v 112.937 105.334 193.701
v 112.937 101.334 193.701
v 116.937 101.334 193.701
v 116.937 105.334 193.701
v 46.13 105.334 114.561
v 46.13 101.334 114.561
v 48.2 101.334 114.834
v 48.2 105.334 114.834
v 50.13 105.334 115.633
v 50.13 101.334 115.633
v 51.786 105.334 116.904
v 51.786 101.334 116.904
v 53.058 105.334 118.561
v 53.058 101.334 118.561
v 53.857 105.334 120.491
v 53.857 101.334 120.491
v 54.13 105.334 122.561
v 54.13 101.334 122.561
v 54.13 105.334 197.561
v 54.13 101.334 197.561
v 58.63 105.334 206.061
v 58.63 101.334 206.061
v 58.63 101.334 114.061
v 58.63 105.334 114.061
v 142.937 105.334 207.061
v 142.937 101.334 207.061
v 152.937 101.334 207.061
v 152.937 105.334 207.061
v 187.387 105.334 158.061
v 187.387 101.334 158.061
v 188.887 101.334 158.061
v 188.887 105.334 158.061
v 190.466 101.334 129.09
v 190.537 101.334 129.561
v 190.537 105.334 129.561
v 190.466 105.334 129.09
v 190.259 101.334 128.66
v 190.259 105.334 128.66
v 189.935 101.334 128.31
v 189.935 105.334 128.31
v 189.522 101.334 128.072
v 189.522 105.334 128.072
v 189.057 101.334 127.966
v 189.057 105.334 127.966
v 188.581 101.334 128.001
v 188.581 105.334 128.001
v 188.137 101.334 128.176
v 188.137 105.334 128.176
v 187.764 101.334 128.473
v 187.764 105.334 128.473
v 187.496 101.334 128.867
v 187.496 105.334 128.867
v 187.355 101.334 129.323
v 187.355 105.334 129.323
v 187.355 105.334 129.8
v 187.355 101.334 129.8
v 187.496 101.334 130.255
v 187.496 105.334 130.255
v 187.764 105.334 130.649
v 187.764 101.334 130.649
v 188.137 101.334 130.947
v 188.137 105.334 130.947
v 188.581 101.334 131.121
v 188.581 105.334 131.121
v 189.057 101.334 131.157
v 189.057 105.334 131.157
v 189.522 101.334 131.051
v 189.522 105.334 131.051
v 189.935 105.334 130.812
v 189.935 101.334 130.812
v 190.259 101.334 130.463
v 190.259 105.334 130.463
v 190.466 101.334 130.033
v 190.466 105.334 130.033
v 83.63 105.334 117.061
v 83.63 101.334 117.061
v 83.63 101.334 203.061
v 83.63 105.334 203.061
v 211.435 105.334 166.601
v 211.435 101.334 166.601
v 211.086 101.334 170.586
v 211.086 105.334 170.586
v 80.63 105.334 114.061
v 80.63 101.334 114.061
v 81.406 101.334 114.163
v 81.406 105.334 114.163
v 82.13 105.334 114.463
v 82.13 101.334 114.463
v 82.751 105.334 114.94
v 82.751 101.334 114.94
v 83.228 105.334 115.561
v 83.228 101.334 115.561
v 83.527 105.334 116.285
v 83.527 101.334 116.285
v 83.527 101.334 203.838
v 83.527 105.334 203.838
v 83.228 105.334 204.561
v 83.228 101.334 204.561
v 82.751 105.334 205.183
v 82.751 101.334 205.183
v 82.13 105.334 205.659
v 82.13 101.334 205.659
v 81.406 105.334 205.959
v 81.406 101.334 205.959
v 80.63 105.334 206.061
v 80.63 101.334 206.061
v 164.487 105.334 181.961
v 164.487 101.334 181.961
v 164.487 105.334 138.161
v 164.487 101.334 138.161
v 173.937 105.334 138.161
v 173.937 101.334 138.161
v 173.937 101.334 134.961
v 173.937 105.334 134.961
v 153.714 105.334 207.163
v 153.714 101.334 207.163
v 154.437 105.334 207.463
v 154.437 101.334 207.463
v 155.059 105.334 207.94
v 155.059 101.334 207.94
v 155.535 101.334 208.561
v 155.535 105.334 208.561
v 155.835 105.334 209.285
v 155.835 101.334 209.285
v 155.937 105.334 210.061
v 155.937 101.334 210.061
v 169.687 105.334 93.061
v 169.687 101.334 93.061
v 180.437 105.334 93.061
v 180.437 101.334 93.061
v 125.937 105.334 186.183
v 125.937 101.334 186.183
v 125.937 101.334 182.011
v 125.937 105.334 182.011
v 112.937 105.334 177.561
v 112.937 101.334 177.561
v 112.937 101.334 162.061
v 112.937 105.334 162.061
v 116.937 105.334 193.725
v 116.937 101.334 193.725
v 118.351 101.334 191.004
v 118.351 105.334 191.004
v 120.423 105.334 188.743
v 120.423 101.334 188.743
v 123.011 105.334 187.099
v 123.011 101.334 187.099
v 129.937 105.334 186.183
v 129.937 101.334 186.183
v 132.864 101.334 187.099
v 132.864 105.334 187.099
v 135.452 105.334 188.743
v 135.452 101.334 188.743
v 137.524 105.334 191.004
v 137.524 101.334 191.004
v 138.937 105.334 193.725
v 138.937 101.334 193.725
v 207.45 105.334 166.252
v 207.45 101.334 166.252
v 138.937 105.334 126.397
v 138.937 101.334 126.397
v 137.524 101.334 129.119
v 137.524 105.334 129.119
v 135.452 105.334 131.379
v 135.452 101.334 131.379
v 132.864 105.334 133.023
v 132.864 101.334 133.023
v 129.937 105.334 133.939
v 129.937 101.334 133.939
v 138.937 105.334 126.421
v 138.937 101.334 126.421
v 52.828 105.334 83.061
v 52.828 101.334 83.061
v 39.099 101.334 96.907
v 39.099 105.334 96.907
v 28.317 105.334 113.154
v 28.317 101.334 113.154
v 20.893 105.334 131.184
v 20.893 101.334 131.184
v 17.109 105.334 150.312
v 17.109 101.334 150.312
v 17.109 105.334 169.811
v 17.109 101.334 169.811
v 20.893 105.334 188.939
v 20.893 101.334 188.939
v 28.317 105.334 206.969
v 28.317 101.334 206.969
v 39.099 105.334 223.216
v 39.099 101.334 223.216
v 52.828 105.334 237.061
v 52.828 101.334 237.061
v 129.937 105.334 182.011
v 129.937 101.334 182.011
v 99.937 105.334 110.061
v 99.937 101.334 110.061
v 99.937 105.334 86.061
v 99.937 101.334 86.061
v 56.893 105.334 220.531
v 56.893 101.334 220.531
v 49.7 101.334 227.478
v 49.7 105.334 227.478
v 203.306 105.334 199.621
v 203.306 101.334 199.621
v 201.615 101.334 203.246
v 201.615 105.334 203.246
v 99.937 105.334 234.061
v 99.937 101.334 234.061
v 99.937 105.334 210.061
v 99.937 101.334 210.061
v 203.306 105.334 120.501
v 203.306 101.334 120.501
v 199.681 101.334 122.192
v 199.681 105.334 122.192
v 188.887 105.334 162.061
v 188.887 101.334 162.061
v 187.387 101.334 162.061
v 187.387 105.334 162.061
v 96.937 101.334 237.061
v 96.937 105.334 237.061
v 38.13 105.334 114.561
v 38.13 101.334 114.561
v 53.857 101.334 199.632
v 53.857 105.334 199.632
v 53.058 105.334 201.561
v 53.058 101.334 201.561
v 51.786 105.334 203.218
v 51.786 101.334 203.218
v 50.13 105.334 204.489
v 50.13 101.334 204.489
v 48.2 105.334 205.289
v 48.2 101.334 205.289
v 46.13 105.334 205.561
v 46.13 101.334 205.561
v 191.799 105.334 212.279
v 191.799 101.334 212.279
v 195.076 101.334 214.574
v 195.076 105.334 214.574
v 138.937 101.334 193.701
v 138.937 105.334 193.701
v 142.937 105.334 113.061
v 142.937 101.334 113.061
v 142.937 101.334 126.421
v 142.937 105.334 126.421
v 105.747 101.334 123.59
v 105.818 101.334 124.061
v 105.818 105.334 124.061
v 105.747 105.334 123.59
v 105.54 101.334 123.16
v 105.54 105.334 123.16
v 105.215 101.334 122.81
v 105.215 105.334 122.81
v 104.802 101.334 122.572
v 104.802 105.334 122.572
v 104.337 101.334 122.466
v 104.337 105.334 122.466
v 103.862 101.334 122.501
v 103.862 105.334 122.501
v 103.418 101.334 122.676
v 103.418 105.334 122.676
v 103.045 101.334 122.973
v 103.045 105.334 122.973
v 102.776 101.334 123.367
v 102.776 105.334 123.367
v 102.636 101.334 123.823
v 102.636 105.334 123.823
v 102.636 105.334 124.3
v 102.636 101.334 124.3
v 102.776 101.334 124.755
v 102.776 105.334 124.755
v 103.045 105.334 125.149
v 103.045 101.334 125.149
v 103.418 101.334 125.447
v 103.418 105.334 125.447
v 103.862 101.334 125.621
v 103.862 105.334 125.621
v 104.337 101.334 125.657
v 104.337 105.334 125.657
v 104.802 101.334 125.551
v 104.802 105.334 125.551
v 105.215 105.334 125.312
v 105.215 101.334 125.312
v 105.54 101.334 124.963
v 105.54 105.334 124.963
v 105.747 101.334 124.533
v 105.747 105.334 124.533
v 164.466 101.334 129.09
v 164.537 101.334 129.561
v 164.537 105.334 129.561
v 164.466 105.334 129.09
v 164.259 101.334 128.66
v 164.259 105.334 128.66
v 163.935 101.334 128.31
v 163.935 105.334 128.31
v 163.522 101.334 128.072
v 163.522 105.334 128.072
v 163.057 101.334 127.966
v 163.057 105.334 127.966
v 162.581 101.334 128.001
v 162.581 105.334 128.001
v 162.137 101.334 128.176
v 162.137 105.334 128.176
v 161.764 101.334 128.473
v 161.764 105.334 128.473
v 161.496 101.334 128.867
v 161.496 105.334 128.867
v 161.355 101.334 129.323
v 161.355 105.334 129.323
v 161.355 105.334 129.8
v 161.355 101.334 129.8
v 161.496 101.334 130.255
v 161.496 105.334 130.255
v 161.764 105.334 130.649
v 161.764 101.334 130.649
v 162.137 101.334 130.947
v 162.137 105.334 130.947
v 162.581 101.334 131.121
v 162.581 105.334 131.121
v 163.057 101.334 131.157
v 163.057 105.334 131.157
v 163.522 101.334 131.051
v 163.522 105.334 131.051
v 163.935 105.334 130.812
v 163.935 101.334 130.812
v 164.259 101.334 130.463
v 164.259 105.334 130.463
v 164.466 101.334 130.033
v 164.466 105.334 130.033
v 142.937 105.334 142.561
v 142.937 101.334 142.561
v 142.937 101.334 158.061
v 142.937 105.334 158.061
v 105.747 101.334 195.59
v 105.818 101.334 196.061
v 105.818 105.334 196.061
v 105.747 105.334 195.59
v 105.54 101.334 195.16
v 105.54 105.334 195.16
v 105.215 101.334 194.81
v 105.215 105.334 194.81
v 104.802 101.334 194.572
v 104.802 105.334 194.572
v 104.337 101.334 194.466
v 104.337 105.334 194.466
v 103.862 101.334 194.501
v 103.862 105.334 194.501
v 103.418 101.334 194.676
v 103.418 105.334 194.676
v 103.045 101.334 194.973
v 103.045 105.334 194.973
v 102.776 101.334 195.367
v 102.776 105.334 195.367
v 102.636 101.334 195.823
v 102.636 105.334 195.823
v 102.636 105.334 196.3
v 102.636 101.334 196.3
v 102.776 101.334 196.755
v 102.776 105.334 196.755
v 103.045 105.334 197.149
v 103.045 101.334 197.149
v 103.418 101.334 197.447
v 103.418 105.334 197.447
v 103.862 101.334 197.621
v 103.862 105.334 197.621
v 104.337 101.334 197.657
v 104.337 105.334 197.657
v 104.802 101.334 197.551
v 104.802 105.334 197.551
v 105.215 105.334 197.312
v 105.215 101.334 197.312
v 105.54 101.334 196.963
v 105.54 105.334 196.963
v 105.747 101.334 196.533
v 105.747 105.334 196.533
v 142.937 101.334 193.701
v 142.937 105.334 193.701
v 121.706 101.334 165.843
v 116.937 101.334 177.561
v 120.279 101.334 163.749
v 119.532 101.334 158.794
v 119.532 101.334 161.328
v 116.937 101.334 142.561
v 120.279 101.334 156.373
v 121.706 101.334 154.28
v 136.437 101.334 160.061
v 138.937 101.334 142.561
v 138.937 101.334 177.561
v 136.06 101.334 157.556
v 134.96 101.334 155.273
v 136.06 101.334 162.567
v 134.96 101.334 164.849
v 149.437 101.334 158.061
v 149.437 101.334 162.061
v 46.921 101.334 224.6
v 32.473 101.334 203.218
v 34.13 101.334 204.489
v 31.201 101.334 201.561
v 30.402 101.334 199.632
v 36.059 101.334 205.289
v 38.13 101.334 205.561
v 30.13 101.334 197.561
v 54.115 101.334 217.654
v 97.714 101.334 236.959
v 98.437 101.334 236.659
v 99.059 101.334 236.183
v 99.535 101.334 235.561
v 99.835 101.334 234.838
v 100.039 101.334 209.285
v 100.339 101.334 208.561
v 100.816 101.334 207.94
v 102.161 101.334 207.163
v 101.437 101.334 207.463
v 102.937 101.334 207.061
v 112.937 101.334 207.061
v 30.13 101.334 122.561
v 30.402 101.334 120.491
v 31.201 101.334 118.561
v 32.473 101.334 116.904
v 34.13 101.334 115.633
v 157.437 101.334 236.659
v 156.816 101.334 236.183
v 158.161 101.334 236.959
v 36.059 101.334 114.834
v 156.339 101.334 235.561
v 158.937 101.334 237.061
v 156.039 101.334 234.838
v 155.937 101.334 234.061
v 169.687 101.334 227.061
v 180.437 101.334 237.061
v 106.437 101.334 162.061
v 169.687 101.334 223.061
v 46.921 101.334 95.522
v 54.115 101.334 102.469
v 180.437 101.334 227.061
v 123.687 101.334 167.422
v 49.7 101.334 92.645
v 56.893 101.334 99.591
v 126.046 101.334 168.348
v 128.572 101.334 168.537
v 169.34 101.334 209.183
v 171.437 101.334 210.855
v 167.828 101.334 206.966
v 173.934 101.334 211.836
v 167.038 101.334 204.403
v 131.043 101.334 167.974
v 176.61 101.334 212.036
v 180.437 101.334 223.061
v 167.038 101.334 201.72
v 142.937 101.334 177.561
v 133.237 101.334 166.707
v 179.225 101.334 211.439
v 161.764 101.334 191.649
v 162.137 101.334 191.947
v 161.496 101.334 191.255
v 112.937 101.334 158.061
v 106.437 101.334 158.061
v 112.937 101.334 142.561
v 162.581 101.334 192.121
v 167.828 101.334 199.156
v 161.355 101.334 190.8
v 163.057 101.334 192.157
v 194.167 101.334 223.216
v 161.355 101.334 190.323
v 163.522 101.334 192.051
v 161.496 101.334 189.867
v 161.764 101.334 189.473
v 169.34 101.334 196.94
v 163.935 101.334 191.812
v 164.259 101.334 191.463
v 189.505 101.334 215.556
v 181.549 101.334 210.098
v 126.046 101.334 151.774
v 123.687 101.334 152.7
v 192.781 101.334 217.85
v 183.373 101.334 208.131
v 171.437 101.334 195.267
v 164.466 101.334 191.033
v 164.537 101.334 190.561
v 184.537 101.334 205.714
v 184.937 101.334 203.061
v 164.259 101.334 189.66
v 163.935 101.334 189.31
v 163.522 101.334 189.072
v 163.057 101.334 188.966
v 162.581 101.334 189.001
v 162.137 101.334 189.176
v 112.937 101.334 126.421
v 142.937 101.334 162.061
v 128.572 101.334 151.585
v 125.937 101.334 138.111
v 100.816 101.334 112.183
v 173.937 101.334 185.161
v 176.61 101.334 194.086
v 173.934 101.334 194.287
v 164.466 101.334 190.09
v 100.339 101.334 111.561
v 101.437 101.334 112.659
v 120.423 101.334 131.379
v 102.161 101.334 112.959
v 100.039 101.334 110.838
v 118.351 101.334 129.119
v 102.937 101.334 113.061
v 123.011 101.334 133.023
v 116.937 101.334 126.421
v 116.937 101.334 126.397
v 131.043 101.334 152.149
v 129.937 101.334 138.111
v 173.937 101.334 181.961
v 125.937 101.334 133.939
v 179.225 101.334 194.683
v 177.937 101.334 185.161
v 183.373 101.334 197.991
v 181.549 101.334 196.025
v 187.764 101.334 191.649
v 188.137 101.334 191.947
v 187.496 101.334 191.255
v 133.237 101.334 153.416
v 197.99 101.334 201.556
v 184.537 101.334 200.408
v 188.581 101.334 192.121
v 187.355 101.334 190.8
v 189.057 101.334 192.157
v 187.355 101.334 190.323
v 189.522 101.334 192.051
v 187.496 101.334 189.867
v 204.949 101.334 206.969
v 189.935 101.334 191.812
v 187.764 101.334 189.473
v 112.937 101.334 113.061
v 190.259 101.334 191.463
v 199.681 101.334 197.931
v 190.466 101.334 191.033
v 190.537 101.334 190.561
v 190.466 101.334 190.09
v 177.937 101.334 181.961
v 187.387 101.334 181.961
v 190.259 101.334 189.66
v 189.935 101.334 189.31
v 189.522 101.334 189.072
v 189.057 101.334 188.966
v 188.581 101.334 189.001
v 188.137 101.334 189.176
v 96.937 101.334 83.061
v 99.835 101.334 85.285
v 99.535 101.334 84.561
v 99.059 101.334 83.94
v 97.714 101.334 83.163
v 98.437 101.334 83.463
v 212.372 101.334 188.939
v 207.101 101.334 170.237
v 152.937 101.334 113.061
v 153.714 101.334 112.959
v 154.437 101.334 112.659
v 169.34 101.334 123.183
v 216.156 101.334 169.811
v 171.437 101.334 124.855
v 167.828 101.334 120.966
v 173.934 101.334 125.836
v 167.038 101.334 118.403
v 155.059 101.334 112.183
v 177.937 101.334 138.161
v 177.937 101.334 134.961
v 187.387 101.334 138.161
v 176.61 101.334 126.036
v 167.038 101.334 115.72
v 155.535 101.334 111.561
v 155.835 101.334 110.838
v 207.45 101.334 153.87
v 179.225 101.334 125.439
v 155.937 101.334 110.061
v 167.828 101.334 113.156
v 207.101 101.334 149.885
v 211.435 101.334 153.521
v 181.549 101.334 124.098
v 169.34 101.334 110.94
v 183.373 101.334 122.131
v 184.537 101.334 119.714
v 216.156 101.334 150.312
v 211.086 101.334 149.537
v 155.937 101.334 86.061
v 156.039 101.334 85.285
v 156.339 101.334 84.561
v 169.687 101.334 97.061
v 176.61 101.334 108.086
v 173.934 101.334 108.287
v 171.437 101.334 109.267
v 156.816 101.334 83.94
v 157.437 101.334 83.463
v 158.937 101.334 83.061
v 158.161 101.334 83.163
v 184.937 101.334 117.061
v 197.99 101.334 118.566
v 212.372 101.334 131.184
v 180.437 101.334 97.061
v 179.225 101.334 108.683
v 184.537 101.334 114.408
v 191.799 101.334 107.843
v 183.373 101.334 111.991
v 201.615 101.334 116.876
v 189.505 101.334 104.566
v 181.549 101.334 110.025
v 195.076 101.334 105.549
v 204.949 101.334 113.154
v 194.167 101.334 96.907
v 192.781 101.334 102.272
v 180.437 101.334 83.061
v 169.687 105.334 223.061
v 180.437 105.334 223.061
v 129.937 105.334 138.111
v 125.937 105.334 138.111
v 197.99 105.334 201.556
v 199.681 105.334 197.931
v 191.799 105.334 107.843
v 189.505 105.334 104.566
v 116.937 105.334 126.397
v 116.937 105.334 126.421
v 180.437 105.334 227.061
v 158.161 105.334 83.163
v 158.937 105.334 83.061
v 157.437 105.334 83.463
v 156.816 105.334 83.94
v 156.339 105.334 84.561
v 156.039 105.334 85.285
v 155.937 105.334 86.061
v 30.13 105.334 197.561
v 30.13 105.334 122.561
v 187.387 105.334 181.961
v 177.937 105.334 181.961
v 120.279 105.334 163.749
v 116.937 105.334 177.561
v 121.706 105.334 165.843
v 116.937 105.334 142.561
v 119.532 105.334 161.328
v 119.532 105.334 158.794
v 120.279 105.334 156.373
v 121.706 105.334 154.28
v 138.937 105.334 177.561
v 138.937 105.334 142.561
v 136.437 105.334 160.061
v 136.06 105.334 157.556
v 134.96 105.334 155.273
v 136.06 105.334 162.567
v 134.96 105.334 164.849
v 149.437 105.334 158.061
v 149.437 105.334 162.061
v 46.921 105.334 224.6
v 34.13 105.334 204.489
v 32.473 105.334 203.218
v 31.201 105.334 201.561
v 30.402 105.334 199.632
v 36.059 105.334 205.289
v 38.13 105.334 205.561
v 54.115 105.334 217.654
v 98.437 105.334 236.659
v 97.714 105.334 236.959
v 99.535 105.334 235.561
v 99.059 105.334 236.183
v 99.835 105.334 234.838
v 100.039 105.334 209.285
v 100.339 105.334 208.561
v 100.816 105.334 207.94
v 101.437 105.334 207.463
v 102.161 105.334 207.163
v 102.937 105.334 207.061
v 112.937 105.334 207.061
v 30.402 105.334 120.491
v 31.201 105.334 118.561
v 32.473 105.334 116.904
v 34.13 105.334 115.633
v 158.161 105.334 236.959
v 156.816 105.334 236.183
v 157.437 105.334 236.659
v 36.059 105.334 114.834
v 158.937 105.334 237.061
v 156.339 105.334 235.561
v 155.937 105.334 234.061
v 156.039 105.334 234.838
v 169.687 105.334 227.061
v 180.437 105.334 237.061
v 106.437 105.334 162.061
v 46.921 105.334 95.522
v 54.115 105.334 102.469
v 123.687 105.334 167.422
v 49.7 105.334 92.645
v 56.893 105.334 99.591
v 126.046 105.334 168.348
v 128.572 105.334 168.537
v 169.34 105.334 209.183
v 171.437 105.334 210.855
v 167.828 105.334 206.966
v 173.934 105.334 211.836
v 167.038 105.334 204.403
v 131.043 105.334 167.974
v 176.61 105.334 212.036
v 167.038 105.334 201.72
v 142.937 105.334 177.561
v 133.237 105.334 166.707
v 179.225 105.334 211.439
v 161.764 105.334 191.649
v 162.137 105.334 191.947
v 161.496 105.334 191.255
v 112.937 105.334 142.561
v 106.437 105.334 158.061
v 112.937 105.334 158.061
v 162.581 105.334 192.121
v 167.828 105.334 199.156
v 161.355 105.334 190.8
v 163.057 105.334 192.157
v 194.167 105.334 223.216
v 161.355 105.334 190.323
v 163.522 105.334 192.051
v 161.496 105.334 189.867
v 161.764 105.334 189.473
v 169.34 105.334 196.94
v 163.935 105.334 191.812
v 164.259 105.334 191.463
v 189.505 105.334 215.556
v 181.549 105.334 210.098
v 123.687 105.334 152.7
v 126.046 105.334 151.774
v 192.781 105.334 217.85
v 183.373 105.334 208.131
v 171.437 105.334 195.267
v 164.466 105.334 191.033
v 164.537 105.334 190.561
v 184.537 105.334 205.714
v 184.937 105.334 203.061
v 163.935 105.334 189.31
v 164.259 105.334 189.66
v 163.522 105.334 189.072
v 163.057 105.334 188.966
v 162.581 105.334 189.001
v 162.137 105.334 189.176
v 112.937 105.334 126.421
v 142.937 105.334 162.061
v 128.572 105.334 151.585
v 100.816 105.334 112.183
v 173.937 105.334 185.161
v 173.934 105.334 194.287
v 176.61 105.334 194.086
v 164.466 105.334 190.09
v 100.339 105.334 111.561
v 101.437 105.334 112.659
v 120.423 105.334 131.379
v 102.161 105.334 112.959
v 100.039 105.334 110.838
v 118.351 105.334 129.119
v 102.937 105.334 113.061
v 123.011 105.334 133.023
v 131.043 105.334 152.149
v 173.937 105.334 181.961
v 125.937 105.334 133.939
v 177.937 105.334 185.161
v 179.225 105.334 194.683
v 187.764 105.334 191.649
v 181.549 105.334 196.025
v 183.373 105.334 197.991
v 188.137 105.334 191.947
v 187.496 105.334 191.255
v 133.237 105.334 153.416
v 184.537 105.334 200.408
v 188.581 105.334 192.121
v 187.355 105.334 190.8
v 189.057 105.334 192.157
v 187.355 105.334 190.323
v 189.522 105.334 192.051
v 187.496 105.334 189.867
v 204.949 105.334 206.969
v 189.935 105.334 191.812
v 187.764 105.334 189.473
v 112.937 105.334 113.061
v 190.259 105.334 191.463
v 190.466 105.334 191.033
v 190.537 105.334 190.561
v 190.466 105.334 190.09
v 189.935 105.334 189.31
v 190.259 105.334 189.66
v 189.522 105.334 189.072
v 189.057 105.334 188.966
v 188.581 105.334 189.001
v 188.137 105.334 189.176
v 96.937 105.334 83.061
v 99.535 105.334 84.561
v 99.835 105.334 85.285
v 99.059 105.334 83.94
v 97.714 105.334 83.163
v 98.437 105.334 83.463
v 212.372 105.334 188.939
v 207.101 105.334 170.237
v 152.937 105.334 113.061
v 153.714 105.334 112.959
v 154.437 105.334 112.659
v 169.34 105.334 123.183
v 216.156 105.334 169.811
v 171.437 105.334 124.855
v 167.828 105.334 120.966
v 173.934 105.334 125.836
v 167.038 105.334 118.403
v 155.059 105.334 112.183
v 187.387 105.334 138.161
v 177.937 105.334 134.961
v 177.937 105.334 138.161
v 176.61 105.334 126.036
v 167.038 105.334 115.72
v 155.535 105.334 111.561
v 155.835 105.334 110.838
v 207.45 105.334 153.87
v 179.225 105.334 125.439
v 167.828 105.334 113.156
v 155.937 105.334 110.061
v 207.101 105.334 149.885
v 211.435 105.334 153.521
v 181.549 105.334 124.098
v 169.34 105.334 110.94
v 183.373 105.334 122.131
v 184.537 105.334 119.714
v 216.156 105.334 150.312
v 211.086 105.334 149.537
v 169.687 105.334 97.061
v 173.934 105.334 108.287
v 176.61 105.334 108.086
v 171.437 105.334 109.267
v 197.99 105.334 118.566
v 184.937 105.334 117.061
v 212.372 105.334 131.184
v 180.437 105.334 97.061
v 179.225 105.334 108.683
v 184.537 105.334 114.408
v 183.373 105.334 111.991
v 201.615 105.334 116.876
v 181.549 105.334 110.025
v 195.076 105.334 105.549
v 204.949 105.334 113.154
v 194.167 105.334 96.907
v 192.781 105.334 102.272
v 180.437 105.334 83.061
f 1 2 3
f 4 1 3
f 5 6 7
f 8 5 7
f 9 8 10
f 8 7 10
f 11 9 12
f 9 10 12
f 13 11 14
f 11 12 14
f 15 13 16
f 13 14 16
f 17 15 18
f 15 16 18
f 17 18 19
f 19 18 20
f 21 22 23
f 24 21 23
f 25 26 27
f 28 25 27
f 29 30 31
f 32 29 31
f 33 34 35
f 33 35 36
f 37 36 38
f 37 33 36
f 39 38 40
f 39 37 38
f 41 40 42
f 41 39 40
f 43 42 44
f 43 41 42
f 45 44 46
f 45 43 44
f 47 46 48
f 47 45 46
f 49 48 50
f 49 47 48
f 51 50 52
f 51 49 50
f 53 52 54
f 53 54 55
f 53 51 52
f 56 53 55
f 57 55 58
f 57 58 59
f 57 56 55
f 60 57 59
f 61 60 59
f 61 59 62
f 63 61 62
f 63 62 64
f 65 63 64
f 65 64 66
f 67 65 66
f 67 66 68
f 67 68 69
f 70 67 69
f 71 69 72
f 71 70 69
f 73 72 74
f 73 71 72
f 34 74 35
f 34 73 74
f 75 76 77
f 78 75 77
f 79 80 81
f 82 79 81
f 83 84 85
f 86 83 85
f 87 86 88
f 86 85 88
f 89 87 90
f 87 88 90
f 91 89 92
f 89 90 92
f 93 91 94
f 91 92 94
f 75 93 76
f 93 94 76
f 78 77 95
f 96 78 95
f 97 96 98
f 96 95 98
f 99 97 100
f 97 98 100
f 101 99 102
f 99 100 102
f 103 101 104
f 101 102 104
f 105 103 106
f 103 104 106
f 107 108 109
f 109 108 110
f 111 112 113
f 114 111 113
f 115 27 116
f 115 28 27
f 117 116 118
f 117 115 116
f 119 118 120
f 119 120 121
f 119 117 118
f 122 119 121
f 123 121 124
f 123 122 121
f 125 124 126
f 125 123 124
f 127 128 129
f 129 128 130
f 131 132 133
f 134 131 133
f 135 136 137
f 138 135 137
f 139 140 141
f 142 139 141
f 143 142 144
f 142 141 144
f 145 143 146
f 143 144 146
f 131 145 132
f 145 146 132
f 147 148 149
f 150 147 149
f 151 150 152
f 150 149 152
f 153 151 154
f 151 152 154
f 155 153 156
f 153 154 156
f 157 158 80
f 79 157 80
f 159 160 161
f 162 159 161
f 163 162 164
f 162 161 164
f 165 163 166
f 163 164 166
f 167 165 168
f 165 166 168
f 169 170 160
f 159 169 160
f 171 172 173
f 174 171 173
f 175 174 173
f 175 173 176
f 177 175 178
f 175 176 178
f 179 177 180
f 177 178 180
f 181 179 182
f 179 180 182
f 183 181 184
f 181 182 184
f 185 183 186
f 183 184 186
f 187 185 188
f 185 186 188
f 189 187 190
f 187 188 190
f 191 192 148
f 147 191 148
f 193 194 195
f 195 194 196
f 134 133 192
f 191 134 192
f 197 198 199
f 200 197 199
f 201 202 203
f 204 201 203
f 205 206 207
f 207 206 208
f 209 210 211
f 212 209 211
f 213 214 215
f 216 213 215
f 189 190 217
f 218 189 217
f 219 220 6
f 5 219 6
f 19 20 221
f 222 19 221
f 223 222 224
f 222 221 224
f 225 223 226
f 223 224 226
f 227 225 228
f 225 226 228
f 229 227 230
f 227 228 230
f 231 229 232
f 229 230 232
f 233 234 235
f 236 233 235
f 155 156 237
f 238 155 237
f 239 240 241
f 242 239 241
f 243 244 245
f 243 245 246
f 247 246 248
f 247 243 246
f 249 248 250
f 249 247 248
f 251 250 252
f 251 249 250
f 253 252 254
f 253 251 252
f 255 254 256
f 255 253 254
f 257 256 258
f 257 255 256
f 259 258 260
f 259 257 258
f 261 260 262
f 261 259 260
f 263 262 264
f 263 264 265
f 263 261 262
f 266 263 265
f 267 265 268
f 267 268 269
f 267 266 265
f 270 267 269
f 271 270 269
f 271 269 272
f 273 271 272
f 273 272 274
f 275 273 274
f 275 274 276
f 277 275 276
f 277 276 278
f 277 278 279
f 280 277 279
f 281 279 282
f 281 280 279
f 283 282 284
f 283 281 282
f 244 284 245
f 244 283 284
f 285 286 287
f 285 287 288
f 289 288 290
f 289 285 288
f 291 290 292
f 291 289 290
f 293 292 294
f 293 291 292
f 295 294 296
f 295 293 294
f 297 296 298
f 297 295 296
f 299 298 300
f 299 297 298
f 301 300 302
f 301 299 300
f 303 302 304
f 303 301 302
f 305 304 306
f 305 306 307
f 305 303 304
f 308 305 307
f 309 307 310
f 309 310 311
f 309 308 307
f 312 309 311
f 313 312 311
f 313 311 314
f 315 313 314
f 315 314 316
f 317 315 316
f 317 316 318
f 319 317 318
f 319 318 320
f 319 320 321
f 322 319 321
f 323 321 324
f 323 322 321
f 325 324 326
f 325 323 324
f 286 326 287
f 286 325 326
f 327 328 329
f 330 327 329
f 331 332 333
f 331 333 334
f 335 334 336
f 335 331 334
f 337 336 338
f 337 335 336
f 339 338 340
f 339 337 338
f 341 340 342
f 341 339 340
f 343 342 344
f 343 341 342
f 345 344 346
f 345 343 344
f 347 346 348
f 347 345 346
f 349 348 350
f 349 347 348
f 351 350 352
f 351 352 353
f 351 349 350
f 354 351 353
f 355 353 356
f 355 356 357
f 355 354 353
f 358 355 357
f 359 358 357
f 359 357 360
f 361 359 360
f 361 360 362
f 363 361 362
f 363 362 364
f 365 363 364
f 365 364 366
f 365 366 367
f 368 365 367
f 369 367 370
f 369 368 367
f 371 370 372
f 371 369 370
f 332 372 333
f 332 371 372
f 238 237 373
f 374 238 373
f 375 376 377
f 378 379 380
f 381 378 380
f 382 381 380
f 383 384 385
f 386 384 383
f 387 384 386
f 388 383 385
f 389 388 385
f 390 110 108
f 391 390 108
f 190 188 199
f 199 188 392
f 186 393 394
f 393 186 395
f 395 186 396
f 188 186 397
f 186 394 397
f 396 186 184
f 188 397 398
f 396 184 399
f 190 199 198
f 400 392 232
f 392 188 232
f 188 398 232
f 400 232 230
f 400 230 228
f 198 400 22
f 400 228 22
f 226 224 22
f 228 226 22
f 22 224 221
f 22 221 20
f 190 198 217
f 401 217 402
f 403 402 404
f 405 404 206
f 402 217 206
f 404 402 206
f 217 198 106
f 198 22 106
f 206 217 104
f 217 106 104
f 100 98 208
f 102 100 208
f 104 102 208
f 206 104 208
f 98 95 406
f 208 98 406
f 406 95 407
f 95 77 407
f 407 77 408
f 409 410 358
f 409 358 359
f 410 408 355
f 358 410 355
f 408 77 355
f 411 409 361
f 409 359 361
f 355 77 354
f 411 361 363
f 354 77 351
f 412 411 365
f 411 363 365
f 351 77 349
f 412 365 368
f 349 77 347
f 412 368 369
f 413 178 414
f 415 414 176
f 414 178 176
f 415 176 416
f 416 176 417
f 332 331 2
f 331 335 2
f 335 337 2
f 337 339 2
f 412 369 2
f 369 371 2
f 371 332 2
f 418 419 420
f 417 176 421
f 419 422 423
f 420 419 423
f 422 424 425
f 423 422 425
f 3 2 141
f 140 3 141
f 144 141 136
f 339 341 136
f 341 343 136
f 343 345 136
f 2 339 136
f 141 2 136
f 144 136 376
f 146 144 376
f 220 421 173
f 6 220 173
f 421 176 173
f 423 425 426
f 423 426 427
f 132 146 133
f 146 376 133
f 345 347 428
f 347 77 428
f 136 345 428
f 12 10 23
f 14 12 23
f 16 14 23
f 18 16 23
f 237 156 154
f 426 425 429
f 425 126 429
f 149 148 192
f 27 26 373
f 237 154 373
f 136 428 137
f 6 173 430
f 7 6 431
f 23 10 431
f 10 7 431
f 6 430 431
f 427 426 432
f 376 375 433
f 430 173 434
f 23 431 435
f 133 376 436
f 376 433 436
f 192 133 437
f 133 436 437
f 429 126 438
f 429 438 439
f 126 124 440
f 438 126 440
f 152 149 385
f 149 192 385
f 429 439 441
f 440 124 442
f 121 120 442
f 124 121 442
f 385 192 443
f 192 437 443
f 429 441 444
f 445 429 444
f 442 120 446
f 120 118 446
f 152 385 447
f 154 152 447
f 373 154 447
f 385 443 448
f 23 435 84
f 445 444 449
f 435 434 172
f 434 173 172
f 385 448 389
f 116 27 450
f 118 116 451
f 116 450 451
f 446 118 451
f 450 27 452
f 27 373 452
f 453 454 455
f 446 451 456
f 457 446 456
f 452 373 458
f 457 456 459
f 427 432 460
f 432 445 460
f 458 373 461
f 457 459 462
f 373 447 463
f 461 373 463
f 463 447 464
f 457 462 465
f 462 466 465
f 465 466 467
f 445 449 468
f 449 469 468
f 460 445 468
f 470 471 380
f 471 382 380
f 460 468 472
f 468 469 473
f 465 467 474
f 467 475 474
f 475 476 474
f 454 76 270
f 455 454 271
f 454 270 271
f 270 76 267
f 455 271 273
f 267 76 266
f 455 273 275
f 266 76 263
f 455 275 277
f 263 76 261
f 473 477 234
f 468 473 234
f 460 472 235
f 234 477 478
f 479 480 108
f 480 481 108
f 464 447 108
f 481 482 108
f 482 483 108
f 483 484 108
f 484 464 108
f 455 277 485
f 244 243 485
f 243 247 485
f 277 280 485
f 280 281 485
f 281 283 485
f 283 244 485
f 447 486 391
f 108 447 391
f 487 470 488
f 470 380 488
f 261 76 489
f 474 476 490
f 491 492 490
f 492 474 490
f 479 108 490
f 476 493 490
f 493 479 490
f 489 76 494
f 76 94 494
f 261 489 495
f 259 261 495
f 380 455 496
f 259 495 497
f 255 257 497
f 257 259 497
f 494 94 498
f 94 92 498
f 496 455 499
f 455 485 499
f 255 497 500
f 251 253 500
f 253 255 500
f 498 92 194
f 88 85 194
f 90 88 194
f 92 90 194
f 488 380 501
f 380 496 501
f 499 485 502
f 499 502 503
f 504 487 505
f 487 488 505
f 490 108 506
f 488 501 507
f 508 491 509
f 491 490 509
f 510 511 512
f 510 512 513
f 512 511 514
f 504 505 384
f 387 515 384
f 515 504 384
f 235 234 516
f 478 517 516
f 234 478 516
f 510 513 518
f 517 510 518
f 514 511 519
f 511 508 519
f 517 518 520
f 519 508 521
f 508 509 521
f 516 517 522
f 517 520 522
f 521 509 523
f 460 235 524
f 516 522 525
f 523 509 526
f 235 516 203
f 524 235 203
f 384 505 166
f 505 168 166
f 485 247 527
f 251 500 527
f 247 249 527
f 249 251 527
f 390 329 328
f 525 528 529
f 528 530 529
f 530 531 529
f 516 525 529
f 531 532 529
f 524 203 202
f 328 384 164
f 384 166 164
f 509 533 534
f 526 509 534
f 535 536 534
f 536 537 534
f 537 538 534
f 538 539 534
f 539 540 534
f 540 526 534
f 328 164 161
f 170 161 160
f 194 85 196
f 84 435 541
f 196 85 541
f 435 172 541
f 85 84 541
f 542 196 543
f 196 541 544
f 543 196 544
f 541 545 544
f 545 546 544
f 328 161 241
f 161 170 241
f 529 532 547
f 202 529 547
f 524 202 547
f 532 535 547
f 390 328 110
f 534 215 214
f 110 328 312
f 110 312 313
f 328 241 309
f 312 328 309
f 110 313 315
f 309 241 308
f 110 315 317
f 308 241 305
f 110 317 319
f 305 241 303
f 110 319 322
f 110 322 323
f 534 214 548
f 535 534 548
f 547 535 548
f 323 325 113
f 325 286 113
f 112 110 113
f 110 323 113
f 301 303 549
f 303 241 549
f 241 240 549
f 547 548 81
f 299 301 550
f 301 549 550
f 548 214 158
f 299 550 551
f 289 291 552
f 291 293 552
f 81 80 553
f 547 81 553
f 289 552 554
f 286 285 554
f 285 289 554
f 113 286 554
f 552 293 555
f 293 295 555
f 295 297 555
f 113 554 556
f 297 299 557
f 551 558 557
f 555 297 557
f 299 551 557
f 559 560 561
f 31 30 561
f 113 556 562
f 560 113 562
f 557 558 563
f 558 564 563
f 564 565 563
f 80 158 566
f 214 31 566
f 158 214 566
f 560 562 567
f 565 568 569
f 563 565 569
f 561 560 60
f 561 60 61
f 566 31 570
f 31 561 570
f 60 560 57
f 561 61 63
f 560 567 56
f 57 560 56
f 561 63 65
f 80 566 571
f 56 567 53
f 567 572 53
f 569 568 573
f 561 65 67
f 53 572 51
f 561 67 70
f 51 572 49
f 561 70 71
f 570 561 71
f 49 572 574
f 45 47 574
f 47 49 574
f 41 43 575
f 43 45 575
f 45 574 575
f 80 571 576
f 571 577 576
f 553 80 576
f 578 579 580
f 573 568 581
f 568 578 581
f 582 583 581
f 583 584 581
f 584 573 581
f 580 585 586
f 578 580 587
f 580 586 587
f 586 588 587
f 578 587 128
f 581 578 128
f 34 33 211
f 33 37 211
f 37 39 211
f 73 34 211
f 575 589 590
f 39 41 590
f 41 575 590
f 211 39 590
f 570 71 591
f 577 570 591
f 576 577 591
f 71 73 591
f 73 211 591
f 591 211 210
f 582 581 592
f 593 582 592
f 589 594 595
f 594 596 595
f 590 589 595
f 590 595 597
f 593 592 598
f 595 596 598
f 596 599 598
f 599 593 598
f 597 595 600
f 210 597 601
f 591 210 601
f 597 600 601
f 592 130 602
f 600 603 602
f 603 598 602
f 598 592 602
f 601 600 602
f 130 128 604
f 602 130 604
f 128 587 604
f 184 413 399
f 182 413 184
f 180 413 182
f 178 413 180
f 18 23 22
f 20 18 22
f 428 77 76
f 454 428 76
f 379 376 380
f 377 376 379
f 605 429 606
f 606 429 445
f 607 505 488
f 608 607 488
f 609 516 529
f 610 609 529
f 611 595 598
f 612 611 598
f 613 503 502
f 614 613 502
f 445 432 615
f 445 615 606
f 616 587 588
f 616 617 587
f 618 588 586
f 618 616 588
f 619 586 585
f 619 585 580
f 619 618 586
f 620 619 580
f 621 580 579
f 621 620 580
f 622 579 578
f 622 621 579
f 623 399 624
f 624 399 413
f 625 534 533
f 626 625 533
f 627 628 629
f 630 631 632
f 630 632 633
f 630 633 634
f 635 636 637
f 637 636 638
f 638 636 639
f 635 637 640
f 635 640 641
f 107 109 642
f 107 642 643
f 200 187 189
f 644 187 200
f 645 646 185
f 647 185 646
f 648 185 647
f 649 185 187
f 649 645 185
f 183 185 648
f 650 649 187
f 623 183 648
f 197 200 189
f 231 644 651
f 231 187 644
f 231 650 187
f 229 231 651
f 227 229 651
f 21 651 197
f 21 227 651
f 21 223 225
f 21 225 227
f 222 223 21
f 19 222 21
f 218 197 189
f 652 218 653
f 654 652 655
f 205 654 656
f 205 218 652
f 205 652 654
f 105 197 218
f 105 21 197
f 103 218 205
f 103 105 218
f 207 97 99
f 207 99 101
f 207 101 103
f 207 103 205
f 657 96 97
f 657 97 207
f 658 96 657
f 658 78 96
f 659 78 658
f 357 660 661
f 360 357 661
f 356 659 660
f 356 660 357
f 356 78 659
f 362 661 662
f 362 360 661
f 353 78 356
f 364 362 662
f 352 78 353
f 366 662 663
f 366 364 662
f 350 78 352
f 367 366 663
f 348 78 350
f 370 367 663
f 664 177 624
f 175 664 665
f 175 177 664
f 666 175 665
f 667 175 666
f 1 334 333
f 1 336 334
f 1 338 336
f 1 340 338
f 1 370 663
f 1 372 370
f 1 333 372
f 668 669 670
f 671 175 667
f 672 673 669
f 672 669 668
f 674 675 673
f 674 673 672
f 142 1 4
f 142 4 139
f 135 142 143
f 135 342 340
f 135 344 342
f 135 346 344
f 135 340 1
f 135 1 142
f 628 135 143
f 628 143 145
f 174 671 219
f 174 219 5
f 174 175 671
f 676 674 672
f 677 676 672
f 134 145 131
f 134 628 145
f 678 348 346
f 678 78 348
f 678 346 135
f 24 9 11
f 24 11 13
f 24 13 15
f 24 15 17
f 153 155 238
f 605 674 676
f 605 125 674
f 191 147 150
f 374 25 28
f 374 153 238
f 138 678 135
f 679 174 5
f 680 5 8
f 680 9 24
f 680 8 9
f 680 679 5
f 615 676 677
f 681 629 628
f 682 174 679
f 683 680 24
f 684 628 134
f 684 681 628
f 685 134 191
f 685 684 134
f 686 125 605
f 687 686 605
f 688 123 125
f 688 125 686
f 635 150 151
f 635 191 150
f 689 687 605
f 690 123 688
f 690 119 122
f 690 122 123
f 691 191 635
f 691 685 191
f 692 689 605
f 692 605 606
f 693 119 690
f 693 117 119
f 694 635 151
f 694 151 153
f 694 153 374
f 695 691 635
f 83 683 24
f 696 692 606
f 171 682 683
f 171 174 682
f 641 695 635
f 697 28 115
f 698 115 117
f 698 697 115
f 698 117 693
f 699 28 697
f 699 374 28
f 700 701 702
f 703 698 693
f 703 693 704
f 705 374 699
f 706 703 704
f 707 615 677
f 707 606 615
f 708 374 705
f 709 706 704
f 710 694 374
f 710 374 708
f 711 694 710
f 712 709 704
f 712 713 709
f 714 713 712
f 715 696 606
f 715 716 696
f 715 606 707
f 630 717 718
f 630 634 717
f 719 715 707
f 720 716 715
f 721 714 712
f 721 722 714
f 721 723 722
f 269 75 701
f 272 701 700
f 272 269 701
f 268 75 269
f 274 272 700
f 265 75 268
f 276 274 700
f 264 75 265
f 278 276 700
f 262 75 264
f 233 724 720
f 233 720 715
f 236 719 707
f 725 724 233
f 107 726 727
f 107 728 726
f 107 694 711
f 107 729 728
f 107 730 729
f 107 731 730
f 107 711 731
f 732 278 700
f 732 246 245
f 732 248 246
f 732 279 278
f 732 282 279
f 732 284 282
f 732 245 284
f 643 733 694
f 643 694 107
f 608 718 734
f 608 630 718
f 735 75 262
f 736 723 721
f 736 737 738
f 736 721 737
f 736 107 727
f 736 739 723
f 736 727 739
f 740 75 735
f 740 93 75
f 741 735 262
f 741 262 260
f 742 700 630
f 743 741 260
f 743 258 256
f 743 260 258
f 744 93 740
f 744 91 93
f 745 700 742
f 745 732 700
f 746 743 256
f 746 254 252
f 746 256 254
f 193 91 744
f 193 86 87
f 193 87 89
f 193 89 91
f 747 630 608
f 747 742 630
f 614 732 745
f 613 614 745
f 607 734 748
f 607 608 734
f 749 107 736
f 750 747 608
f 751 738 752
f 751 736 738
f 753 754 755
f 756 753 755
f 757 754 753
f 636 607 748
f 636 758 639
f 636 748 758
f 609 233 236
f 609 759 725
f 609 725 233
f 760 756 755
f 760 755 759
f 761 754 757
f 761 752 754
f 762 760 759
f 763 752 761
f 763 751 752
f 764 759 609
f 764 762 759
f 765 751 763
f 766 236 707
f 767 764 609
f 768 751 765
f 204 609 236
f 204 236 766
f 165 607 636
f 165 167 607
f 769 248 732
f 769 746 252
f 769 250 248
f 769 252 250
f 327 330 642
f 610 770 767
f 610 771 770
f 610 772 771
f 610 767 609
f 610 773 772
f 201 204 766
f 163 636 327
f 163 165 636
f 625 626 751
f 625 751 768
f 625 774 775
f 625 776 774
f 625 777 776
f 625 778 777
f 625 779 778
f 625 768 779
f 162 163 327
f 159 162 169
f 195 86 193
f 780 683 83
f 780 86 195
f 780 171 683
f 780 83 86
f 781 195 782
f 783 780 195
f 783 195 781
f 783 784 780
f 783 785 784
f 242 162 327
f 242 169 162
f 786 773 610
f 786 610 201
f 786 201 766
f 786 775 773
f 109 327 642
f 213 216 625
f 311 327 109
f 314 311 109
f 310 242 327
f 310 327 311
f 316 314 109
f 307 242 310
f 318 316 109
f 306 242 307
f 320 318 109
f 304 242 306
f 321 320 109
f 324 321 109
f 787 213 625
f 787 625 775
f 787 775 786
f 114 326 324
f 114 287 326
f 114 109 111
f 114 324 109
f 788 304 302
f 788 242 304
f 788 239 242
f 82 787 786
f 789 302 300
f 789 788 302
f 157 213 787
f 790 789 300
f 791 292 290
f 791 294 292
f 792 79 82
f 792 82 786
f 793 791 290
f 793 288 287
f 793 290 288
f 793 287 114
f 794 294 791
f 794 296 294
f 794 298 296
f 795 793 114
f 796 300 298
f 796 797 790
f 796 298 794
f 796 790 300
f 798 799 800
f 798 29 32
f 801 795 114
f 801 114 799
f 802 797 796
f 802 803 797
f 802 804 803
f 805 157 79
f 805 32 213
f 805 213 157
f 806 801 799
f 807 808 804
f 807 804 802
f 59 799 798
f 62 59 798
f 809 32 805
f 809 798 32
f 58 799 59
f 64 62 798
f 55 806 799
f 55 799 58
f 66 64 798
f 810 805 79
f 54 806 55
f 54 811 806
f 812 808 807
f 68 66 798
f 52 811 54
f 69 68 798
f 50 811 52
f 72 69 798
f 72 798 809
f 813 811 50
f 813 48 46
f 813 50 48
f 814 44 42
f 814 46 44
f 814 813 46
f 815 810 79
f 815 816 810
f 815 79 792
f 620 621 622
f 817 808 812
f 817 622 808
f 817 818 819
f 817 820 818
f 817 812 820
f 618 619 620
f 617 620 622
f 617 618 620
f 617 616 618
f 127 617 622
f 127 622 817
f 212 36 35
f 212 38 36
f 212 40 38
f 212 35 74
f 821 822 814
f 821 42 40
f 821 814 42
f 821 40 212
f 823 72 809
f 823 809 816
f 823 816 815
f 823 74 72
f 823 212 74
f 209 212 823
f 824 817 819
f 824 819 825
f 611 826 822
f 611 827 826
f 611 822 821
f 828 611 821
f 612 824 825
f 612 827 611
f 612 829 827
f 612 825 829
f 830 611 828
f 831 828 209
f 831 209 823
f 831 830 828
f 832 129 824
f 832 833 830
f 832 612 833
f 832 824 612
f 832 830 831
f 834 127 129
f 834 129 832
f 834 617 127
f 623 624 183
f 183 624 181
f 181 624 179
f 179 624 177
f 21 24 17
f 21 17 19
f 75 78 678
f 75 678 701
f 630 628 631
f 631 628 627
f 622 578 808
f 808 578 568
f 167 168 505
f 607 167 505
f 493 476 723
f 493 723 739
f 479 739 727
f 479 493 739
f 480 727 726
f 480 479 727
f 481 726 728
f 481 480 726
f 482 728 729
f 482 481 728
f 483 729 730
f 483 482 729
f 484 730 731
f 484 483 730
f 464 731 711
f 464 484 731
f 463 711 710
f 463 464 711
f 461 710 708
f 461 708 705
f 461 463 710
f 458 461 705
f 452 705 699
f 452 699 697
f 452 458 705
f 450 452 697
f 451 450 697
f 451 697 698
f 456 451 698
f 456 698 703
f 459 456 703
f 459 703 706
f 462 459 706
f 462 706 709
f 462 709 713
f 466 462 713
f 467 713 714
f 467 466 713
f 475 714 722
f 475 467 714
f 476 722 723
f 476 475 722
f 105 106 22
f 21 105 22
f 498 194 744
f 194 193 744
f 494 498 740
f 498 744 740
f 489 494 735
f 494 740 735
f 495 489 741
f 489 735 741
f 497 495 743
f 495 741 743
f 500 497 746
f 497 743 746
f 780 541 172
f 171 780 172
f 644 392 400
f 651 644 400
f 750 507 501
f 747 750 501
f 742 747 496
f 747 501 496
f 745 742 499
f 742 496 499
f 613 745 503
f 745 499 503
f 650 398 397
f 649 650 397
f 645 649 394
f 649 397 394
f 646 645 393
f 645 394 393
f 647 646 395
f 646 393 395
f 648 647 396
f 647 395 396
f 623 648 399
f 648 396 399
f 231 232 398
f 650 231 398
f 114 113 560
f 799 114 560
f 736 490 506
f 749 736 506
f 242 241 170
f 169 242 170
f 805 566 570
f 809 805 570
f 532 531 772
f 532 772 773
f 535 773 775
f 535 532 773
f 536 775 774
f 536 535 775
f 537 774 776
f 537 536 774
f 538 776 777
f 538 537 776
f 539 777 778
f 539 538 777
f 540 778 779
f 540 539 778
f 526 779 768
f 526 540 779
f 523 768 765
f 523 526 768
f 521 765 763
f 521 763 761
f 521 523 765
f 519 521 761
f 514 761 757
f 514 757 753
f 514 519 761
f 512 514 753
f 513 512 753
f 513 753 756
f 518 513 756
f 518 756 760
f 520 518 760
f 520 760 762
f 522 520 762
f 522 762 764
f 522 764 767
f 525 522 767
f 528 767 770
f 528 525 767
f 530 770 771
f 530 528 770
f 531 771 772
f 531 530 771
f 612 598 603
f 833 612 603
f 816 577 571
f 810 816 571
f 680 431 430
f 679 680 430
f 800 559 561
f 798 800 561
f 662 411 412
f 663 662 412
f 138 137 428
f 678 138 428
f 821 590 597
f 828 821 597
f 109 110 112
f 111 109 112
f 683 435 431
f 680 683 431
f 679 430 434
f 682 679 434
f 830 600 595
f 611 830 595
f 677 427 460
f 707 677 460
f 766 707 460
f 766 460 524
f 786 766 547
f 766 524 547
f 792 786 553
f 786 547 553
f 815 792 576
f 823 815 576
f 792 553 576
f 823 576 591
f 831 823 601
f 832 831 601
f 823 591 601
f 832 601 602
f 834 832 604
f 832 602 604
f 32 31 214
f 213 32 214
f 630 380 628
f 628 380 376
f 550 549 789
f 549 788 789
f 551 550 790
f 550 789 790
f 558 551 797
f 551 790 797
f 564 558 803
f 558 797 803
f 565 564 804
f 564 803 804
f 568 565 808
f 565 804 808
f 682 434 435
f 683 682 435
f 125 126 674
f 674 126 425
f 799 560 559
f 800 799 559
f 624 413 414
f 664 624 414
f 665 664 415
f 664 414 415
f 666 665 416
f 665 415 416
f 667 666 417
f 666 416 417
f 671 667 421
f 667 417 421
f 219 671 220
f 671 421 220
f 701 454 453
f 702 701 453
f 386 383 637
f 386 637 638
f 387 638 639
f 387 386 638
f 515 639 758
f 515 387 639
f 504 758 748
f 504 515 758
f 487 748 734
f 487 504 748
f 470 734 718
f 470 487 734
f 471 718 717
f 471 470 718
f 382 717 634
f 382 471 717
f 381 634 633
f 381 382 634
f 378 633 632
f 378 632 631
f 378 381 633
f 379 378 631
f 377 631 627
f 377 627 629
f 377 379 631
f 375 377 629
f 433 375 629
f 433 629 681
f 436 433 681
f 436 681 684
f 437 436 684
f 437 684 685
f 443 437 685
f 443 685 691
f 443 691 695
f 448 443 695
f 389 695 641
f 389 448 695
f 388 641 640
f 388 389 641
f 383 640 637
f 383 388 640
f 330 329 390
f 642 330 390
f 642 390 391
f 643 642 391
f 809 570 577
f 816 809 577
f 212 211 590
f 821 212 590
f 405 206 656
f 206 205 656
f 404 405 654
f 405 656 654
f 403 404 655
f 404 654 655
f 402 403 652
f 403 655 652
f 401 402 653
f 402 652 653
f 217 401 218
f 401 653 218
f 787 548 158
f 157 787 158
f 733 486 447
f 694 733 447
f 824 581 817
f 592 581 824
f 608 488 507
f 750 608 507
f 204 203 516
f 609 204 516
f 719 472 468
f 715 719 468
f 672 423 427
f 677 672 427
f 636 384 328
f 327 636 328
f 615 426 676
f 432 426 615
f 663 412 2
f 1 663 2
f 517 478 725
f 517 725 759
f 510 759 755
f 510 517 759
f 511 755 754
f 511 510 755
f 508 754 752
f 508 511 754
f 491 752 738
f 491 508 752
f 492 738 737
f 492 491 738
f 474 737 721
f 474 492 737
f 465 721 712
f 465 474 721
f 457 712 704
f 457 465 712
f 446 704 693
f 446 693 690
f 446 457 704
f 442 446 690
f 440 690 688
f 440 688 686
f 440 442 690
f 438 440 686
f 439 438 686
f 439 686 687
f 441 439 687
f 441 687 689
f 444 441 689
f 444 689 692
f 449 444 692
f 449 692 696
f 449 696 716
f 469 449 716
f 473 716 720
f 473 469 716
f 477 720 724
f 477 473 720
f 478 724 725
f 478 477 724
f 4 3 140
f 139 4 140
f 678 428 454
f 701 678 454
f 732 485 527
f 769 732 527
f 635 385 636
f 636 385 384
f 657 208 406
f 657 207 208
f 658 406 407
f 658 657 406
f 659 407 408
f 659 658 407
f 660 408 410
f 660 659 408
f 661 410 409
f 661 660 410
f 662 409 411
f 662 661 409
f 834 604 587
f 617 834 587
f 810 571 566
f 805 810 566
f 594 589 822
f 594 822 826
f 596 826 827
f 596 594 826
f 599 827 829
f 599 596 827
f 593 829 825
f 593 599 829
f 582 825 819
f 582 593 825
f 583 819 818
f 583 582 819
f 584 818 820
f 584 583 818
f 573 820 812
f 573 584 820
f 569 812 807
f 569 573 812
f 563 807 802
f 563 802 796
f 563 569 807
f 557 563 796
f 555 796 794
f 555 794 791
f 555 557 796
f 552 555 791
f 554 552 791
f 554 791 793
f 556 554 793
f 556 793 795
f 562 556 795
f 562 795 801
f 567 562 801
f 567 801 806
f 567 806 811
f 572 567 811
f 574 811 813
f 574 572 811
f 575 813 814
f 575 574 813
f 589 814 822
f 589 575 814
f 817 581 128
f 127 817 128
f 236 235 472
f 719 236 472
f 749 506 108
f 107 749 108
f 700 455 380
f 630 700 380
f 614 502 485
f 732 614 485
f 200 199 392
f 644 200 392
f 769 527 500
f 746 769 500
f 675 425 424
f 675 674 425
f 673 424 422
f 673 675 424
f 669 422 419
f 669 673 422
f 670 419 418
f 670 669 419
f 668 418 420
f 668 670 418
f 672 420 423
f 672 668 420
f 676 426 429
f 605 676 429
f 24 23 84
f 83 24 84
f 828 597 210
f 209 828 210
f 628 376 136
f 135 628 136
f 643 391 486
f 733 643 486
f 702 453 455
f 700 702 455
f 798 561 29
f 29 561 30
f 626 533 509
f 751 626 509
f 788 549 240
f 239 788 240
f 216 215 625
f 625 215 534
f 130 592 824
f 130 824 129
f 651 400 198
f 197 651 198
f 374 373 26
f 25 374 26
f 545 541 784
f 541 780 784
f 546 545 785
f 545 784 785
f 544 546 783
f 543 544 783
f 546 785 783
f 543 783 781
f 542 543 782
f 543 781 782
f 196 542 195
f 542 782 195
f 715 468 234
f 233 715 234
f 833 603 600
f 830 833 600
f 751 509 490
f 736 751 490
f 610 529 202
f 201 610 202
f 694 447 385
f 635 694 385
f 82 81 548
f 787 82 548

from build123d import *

# Parameters (mm, degrees)
SKETCH1_W           = 10.75
SKETCH1_H           = 4
SKETCH1_R           = 1.6
SKETCH1_R_2         = 9
SKETCH1_R_3         = 8.5
BOSS_EXTRUDE1_DEPTH = 4
FILLET2_R           = 3


with BuildPart() as part:
    # Sketch1 → Boss-Extrude1 (new body)
    with BuildSketch(Plane(origin=(0, 101.33365526, 0), x_dir=(1, 0, 0), z_dir=(0, 1, 0))):
        with BuildLine():
            Line((99.937186027, -237.061198021), (99.937186027, -207.061198021))
            Line((99.937186027, -207.061198021), (112.937186027, -207.061198021))
            Line((112.937186027, -207.061198021), (112.937186027, -193.701198021))
            Line((112.937186027, -193.701198021), (116.937186027, -193.701198021))
            Line((116.937186027, -193.701198021), (116.937186027, -193.724971735))
            ThreePointArc((116.937186027, -193.724971735), (120.422613168, -188.743411519), (125.937186027, -186.183405518))
            Line((125.937186027, -186.183405518), (125.937186027, -182.011198021))
            Line((125.937186027, -182.011198021), (129.937186027, -182.011198021))
            Line((129.937186027, -182.011198021), (129.937186027, -186.183405518))
            ThreePointArc((129.937186027, -186.183405518), (135.451758886, -188.743411519), (138.937186027, -193.724971735))
            Line((138.937186027, -193.724971735), (138.937186027, -193.701198021))
            Line((138.937186027, -193.701198021), (142.937186027, -193.701198021))
            Line((142.937186027, -193.701198021), (142.937186027, -207.061198021))
            Line((142.937186027, -207.061198021), (155.937186027, -207.061198021))
            Line((155.937186027, -207.061198021), (155.937186027, -237.061198021))
            Line((155.937186027, -237.061198021), (180.437186027, -237.061198021))
            ThreePointArc((180.437186027, -237.061198021), (216.632797463, -160.061198021), (180.437186027, -83.061198021))
            Line((180.437186027, -83.061198021), (155.937186027, -83.061198021))
            Line((155.937186027, -83.061198021), (155.937186027, -113.061198021))
            Line((155.937186027, -113.061198021), (142.937186027, -113.061198021))
            Line((142.937186027, -113.061198021), (142.937186027, -126.421198021))
            Line((142.937186027, -126.421198021), (138.937186027, -126.421198021))
            Line((138.937186027, -126.421198021), (138.937186027, -126.397424307))
            ThreePointArc((138.937186027, -126.397424307), (135.451758886, -131.378984523), (129.937186027, -133.938990524))
            Line((129.937186027, -133.938990524), (129.937186027, -138.111198021))
            Line((129.937186027, -138.111198021), (125.937186027, -138.111198021))
            Line((125.937186027, -138.111198021), (125.937186027, -133.938990524))
            ThreePointArc((125.937186027, -133.938990524), (120.422613168, -131.378984523), (116.937186027, -126.397424307))
            Line((116.937186027, -126.397424307), (116.937186027, -126.421198021))
            Line((116.937186027, -126.421198021), (112.937186027, -126.421198021))
            Line((112.937186027, -126.421198021), (112.937186027, -113.061198021))
            Line((112.937186027, -113.061198021), (99.937186027, -113.061198021))
            Line((99.937186027, -113.061198021), (99.937186027, -83.061198021))
            Line((99.937186027, -83.061198021), (52.828408899, -83.061198021))
            ThreePointArc((52.828408899, -83.061198021), (16.632797463, -160.061198021), (52.828408899, -237.061198021))
            Line((52.828408899, -237.061198021), (99.937186027, -237.061198021))
        make_face()
        with Locations((175.062186027, -95.061198021)):
            Rectangle(SKETCH1_W, SKETCH1_H, mode=Mode.SUBTRACT)
        Polygon((56.893376849, -220.531213103), (49.699978846, -227.477796808), (46.921345364, -224.600437606), (54.114743367, -217.653853902), align=None, mode=Mode.SUBTRACT)
        with Locations((104.217909851, -196.061198021)):
            Circle(SKETCH1_R, mode=Mode.SUBTRACT)
        Polygon((116.937186027, -142.561198021), (116.937186027, -177.561198021), (112.937186027, -177.561198021), (112.937186027, -162.061198021), (106.437186027, -162.061198021), (106.437186027, -158.061198021), (112.937186027, -158.061198021), (112.937186027, -142.561198021), align=None, mode=Mode.SUBTRACT)
        with Locations((175.062186027, -225.061198021)):
            Rectangle(SKETCH1_W, SKETCH1_H, mode=Mode.SUBTRACT)
        with Locations((175.937186027, -203.061198021)):
            Circle(SKETCH1_R_2, mode=Mode.SUBTRACT)
        Polygon((192.781361608, -217.850313996), (189.504753431, -215.55600825), (191.799059176, -212.279400073), (195.075667353, -214.573705818), align=None, mode=Mode.SUBTRACT)
        Polygon((201.615472458, -203.246431106), (197.990241309, -201.555958059), (199.680714356, -197.930726911), (203.305945504, -199.621199958), align=None, mode=Mode.SUBTRACT)
        with Locations((162.937186027, -190.561198021)):
            Circle(SKETCH1_R, mode=Mode.SUBTRACT)
        Polygon((138.937186027, -142.561198021), (142.937186027, -142.561198021), (142.937186027, -158.061198021), (149.437186027, -158.061198021), (149.437186027, -162.061198021), (142.937186027, -162.061198021), (142.937186027, -177.561198021), (138.937186027, -177.561198021), align=None, mode=Mode.SUBTRACT)
        with Locations((188.937186027, -190.561198021)):
            Circle(SKETCH1_R, mode=Mode.SUBTRACT)
        Polygon((173.937186027, -138.161198021), (173.937186027, -134.961198021), (177.937186027, -134.961198021), (177.937186027, -138.161198021), (187.387186027, -138.161198021), (187.387186027, -158.061198021), (188.887186027, -158.061198021), (188.887186027, -162.061198021), (187.387186027, -162.061198021), (187.387186027, -181.961198021), (177.937186027, -181.961198021), (177.937186027, -185.161198021), (173.937186027, -185.161198021), (173.937186027, -181.961198021), (164.487186027, -181.961198021), (164.487186027, -138.161198021), align=None, mode=Mode.SUBTRACT)
        Polygon((211.08596232, -170.585781918), (207.101183528, -170.237158947), (207.449806499, -166.252380154), (211.434585291, -166.601003125), align=None, mode=Mode.SUBTRACT)
        with BuildLine():
            ThreePointArc((30.129612814, -122.561198021), (32.472758565, -116.904343772), (38.129612814, -114.561198021))
            Line((38.129612814, -114.561198021), (46.129612814, -114.561198021))
            ThreePointArc((46.129612814, -114.561198021), (51.786467064, -116.904343772), (54.129612814, -122.561198021))
            Line((54.129612814, -122.561198021), (54.129612814, -197.561198021))
            ThreePointArc((54.129612814, -197.561198021), (51.786467064, -203.21805227), (46.129612814, -205.561198021))
            Line((46.129612814, -205.561198021), (38.129612814, -205.561198021))
            ThreePointArc((38.129612814, -205.561198021), (32.472758565, -203.21805227), (30.129612814, -197.561198021))
            Line((30.129612814, -197.561198021), (30.129612814, -122.561198021))
        make_face(mode=Mode.SUBTRACT)
        with BuildLine():
            Line((58.629612814, -206.061198021), (58.629612814, -114.061198021))
            Line((58.629612814, -114.061198021), (80.629612814, -114.061198021))
            ThreePointArc((80.629612814, -114.061198021), (82.750933158, -114.939877677), (83.629612814, -117.061198021))
            Line((83.629612814, -117.061198021), (83.629612814, -203.061198021))
            ThreePointArc((83.629612814, -203.061198021), (82.750933158, -205.182518365), (80.629612814, -206.061198021))
            Line((80.629612814, -206.061198021), (58.629612814, -206.061198021))
        make_face(mode=Mode.SUBTRACT)
        with Locations((104.217909851, -124.061198021)):
            Circle(SKETCH1_R, mode=Mode.SUBTRACT)
        Polygon((54.114743367, -102.46854214), (46.921345364, -95.521958436), (49.699978846, -92.644599234), (56.893376849, -99.591182939), align=None, mode=Mode.SUBTRACT)
        with Locations((127.937186027, -160.061198021)):
            Circle(SKETCH1_R_3, mode=Mode.SUBTRACT)
        with Locations((162.937186027, -129.561198021)):
            Circle(SKETCH1_R, mode=Mode.SUBTRACT)
        Polygon((211.434585291, -153.521392917), (207.449806499, -153.870015888), (207.101183528, -149.885237095), (211.08596232, -149.536614124), align=None, mode=Mode.SUBTRACT)
        with Locations((188.937186027, -129.561198021)):
            Circle(SKETCH1_R, mode=Mode.SUBTRACT)
        with Locations((175.937186027, -117.061198021)):
            Circle(SKETCH1_R_2, mode=Mode.SUBTRACT)
        Polygon((203.305945504, -120.501196084), (199.680714356, -122.191669131), (197.990241309, -118.566437983), (201.615472457, -116.875964936), align=None, mode=Mode.SUBTRACT)
        Polygon((195.075667353, -105.548690224), (191.799059176, -107.842995969), (189.504753431, -104.566387792), (192.781361608, -102.272082046), align=None, mode=Mode.SUBTRACT)
    extrude(amount=BOSS_EXTRUDE1_DEPTH)

    # Fillet2
    fillet2_edges = [part.edges().sort_by_distance(p)[0] for p in [
        (99.937186027, 103.33365526, 83.061198021),
        (99.937186027, 103.33365526, 113.061198021),
        (155.937186027, 103.33365526, 113.061198021),
        (155.937186027, 103.33365526, 83.061198021),
        (155.937186027, 103.33365526, 237.061198021),
        (155.937186027, 103.33365526, 207.061198021),
        (99.937186027, 103.33365526, 207.061198021),
        (99.937186027, 103.33365526, 237.061198021),
    ]]
    fillet(fillet2_edges, radius=FILLET2_R)


solid = part.part
